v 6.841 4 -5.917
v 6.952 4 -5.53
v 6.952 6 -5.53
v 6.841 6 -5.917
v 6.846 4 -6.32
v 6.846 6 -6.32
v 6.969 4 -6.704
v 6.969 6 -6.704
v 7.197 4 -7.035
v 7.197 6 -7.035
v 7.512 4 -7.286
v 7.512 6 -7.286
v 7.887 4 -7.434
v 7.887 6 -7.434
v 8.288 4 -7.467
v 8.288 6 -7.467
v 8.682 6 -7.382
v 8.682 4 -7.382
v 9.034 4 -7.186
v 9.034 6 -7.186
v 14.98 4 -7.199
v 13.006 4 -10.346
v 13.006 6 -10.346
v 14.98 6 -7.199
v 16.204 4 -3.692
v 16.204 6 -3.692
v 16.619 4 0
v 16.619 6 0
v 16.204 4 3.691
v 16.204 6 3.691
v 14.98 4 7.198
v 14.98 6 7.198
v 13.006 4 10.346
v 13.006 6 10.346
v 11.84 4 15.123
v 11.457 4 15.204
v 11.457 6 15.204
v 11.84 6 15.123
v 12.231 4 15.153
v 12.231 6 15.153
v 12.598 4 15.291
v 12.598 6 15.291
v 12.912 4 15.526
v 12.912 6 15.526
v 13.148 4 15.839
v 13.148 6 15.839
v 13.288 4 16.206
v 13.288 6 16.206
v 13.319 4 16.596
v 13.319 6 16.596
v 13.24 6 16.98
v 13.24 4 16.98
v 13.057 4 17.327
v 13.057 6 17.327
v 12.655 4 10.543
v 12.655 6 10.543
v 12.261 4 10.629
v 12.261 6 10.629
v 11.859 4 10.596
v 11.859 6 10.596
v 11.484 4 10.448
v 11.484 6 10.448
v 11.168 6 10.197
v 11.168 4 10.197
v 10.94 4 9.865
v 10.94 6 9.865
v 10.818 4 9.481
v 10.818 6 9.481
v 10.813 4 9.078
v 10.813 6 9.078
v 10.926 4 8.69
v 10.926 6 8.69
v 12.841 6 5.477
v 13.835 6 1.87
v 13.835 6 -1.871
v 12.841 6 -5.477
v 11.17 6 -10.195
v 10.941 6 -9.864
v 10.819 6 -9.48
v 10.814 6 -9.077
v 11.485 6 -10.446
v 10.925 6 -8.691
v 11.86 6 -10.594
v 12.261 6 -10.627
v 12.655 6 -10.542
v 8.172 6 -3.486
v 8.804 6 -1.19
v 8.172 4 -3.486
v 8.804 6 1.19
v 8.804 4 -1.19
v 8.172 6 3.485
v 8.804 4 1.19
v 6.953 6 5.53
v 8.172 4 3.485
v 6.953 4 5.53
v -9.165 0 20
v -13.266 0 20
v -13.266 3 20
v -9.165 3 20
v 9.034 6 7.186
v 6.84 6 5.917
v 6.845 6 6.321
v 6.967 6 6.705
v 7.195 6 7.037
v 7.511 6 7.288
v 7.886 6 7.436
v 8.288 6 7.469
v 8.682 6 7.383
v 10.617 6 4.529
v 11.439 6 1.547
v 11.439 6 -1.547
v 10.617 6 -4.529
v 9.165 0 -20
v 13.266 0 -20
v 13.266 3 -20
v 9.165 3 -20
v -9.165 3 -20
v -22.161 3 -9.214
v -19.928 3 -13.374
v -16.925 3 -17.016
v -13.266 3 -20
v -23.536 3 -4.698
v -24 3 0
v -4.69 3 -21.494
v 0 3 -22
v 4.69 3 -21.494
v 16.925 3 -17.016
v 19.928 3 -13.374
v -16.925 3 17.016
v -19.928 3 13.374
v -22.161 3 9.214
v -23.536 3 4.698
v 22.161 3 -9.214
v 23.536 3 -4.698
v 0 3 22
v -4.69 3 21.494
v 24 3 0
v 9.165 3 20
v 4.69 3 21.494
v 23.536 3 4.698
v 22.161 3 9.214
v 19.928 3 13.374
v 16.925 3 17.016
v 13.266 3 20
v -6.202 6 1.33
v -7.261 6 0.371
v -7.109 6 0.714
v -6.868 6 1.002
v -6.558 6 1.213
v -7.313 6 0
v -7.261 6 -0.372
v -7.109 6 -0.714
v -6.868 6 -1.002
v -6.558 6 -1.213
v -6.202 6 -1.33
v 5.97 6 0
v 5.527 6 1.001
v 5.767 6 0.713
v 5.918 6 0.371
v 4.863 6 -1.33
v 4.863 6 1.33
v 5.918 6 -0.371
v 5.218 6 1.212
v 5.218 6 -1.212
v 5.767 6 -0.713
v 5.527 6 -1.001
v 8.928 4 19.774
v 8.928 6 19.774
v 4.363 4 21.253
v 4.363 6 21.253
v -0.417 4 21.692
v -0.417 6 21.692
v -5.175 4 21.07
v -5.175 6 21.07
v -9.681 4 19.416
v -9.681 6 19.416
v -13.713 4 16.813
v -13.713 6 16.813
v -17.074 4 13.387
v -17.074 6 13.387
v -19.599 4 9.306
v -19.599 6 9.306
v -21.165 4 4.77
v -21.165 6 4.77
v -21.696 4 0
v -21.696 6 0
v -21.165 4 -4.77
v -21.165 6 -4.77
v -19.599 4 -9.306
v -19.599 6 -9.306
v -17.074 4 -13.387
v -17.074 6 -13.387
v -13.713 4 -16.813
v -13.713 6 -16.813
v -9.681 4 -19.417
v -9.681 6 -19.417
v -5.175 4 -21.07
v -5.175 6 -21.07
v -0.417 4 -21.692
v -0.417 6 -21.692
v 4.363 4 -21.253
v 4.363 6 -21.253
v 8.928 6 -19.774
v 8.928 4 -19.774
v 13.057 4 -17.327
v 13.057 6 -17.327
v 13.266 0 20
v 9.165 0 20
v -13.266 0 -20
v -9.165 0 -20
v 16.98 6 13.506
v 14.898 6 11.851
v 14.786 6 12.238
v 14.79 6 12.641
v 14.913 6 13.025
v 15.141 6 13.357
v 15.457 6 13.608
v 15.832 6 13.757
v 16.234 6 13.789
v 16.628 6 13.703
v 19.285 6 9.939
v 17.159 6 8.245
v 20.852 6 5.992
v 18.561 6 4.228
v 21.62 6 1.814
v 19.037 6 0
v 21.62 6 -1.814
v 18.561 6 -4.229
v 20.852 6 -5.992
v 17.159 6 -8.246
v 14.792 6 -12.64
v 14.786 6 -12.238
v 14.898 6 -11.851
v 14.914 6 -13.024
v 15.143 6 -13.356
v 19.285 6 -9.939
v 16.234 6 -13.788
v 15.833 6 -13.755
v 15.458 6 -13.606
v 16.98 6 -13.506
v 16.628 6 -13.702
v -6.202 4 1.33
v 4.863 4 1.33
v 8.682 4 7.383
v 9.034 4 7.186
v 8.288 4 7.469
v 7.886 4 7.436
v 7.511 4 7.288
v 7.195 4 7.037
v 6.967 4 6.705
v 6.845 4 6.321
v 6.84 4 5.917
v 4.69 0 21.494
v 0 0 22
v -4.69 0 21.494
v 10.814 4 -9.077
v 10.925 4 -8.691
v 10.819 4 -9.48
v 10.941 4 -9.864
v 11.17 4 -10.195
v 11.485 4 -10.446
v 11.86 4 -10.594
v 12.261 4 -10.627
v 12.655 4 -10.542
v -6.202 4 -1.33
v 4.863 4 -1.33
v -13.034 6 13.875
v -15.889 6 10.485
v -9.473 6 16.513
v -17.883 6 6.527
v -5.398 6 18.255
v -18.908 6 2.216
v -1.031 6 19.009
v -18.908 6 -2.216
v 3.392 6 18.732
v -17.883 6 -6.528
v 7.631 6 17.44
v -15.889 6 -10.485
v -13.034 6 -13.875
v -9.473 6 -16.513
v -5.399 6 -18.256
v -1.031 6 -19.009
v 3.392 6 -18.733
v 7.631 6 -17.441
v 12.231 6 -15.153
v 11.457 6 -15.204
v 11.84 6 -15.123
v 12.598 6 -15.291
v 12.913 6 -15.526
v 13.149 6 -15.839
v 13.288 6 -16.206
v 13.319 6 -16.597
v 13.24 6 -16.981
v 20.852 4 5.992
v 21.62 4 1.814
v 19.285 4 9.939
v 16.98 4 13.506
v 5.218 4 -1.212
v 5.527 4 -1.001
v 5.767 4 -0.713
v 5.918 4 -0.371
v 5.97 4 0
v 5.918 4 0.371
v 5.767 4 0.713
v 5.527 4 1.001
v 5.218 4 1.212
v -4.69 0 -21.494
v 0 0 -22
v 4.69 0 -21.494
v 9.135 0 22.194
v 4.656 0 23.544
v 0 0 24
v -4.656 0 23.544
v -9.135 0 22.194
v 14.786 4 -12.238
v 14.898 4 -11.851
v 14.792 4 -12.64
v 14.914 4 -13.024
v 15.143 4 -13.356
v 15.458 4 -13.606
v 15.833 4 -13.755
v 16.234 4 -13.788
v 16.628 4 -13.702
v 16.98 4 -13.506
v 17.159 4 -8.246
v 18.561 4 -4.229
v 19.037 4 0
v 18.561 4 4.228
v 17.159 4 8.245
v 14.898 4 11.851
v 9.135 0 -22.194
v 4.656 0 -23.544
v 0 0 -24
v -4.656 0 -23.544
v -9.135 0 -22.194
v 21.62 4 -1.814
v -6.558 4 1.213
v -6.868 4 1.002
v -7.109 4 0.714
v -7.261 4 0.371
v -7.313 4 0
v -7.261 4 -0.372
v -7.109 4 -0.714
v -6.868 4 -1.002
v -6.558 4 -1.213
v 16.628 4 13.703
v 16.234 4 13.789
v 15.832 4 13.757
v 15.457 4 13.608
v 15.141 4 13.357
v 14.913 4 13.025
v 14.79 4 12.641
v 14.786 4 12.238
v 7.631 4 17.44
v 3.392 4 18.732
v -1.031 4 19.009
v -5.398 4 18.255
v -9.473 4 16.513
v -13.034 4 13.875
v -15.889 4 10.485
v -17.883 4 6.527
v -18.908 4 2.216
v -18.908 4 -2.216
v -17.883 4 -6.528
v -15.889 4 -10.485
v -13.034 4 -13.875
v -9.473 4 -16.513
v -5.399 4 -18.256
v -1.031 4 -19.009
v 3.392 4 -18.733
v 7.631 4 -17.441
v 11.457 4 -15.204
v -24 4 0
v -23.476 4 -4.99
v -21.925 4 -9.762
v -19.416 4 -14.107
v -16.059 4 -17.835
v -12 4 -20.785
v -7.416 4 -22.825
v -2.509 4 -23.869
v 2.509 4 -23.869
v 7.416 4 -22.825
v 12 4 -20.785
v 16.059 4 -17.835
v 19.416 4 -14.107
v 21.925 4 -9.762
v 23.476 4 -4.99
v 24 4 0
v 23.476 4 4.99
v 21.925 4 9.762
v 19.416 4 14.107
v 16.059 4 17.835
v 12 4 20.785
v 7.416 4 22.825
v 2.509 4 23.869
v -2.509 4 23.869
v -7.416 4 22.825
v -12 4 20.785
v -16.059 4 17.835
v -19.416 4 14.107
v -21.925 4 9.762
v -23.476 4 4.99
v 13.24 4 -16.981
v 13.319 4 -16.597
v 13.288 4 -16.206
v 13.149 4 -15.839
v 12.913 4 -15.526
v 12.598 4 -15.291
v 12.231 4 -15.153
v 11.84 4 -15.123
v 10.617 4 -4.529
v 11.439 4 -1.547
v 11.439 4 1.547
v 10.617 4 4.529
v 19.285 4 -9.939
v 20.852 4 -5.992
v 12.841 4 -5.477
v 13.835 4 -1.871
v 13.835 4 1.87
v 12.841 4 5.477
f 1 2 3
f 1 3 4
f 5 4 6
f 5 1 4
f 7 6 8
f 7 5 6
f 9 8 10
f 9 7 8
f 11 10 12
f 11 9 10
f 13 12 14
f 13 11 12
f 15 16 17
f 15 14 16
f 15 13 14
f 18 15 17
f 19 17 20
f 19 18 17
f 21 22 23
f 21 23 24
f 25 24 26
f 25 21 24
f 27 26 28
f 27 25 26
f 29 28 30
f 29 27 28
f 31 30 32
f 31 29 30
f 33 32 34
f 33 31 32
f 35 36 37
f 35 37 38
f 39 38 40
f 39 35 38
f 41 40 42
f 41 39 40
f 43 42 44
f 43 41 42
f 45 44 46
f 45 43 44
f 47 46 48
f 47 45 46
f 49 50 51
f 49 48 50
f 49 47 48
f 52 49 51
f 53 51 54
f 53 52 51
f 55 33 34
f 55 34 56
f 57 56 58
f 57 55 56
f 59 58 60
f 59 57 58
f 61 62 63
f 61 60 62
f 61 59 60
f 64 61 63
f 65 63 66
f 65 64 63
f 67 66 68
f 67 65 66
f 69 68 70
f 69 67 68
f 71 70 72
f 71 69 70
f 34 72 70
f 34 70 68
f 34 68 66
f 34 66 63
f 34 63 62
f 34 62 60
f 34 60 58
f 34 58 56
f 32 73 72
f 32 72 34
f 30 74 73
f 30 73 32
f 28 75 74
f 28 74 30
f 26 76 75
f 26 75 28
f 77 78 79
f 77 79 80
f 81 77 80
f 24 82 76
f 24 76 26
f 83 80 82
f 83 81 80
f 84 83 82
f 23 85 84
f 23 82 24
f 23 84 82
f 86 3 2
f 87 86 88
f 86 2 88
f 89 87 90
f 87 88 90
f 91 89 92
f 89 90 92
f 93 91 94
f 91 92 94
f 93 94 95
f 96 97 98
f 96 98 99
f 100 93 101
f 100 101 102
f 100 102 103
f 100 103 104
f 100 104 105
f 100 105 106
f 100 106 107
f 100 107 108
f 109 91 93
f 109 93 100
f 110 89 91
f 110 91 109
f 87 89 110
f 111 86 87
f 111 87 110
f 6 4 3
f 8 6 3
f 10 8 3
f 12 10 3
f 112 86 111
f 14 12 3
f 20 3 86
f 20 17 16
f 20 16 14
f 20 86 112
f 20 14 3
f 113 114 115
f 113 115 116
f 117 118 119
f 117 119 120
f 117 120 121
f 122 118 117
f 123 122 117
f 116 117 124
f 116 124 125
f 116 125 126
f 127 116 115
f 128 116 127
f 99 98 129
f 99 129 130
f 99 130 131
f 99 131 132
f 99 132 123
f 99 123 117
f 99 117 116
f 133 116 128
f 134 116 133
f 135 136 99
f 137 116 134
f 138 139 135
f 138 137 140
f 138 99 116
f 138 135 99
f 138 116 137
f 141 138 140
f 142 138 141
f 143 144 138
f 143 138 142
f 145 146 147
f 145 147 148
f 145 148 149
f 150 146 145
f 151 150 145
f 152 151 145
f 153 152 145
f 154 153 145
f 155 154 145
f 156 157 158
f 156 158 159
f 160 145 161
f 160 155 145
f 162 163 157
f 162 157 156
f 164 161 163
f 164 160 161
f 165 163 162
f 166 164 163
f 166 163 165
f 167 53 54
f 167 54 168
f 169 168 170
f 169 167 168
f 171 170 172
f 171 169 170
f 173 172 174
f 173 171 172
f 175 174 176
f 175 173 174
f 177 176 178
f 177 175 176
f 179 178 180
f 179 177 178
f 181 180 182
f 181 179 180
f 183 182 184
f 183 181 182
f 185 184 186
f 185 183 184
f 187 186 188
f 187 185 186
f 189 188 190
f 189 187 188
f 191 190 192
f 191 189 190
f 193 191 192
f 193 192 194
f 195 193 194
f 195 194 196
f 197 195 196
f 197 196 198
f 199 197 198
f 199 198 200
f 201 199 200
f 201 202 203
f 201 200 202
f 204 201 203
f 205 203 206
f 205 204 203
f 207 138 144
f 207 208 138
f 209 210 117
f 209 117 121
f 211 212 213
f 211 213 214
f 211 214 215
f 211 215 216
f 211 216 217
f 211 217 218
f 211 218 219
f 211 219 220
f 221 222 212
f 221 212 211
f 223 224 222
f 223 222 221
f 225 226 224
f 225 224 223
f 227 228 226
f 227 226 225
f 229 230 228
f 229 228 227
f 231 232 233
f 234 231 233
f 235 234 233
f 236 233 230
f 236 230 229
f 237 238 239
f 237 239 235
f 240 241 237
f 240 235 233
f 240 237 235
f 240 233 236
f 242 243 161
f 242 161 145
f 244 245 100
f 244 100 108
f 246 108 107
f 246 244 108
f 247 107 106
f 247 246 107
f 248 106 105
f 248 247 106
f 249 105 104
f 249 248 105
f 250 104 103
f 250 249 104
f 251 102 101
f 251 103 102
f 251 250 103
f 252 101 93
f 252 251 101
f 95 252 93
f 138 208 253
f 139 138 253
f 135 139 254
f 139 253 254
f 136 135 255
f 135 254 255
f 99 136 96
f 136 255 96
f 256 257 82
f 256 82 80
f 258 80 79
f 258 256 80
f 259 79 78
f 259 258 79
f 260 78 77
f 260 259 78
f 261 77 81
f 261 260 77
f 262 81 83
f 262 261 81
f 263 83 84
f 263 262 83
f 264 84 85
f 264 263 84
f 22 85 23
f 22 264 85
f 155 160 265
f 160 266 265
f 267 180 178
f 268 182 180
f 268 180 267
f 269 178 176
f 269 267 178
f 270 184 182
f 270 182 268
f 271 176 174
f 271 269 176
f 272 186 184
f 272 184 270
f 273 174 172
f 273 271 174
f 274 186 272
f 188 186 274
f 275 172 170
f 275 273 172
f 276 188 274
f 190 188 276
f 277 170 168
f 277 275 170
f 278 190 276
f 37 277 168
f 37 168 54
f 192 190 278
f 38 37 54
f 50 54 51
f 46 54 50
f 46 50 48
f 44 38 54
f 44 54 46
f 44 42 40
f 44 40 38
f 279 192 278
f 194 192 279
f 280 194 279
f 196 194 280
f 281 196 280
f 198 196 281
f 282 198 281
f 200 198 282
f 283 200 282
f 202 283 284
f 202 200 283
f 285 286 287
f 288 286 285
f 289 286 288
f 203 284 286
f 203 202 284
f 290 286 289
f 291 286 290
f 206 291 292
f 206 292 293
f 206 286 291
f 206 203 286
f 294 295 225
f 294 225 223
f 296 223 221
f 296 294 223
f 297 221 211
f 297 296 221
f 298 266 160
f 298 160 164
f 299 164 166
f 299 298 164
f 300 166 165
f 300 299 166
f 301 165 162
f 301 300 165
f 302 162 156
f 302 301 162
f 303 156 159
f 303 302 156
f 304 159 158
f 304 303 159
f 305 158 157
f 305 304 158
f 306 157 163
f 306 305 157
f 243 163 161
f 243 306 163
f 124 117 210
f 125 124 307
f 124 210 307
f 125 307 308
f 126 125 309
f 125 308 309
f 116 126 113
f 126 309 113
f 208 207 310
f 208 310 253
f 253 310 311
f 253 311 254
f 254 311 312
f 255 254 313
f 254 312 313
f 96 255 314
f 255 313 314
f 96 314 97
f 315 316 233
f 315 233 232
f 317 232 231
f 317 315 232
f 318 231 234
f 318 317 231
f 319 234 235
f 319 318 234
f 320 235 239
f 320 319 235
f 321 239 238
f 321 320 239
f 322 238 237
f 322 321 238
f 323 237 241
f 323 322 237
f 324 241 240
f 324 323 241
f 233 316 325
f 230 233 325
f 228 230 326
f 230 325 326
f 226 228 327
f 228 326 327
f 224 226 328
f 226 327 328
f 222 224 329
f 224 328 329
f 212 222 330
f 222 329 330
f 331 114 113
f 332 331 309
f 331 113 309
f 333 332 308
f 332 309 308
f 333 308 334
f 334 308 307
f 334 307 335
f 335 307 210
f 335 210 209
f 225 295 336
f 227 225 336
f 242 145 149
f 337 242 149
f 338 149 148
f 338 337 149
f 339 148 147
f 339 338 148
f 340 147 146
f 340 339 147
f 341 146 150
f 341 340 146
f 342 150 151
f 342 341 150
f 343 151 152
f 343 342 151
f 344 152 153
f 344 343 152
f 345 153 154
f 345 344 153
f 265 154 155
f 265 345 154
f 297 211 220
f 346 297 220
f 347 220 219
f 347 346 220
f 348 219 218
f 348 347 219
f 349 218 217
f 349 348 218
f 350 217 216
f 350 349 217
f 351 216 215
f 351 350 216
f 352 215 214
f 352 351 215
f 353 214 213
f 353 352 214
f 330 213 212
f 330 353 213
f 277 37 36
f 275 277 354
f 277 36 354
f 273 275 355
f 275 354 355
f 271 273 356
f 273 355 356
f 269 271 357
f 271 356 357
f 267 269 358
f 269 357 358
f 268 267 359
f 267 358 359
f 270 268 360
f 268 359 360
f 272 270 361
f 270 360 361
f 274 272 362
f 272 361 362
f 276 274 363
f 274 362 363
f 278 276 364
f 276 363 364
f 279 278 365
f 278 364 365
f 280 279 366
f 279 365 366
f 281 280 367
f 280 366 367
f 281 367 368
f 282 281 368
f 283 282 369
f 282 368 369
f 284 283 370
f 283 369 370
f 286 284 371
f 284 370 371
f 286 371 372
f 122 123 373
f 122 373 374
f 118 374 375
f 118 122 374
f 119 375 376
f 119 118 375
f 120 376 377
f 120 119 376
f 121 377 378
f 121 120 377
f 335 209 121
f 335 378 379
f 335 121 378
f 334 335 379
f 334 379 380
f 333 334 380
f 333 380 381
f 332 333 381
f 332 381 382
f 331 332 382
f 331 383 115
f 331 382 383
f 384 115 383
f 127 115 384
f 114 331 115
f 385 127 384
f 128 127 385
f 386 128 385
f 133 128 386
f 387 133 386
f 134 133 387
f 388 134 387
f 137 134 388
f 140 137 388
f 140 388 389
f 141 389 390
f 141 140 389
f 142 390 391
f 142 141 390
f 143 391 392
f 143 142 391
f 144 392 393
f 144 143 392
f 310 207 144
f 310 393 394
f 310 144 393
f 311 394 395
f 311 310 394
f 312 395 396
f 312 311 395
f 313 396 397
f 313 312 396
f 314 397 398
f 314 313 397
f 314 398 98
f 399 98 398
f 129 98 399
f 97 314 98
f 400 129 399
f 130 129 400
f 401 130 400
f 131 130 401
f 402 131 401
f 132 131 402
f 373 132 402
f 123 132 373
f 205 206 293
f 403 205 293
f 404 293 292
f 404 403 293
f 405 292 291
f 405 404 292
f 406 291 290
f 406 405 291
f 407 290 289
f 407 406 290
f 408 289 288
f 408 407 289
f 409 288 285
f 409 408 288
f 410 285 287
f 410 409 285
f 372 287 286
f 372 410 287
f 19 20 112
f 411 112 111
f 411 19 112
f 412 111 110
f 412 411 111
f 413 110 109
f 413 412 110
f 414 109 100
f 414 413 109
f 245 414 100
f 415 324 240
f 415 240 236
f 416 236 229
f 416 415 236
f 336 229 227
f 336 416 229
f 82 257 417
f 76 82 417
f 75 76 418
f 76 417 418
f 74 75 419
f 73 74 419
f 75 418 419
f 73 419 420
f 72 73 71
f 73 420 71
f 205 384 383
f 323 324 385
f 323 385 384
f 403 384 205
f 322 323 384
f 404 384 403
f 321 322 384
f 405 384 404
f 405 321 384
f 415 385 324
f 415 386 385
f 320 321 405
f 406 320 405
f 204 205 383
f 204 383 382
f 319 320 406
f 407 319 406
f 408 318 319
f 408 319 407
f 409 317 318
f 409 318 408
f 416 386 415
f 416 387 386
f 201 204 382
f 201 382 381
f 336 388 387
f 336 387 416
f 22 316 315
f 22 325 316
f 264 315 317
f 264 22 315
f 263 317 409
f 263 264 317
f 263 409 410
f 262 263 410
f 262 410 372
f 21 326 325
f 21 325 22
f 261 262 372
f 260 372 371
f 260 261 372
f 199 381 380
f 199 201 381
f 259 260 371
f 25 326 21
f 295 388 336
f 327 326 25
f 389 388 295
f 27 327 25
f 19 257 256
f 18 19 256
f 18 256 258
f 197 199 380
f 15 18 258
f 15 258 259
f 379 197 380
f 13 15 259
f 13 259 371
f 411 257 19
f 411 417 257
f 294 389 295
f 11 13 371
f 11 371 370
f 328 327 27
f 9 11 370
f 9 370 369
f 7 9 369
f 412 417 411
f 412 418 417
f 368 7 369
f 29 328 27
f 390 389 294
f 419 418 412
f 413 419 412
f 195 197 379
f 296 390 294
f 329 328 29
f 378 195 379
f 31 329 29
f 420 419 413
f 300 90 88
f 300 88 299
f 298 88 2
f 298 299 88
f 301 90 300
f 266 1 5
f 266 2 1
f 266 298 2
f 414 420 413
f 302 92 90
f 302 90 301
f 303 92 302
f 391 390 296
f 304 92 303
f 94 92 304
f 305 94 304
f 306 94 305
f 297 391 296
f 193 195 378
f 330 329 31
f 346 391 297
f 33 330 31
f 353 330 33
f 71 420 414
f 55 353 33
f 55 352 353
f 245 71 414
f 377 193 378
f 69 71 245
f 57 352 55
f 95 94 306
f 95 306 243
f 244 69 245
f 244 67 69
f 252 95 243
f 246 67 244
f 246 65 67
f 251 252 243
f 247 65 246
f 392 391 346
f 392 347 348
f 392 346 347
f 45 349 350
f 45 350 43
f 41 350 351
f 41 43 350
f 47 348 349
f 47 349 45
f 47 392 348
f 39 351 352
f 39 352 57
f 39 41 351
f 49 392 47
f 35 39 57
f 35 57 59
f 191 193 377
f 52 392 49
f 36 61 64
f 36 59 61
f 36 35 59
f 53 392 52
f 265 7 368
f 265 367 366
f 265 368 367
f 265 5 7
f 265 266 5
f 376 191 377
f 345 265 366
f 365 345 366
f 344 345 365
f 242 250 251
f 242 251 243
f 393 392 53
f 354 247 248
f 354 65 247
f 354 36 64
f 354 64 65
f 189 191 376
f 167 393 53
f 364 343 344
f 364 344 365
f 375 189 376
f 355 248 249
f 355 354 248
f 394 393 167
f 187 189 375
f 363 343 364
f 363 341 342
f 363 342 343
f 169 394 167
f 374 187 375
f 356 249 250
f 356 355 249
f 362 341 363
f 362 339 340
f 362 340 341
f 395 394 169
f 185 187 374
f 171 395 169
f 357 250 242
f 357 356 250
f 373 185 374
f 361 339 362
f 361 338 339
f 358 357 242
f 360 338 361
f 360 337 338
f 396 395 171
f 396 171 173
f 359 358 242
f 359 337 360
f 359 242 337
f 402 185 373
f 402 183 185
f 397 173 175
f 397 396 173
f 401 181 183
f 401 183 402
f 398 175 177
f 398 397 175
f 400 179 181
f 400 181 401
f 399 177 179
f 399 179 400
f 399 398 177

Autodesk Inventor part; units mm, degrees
ref_plane "YZ Plane" through (0, 0, 0) normal (1, 0, 0) x (0, 1, 0)
ref_plane "XZ Plane" through (0, 0, 0) normal (0, 1, 0) x (-1, 0, 0)
ref_plane "XY Plane" through (0, 0, 0) normal (0, 0, 1) x (1, 0, 0)
sketch "Sketch1" plane through (0, 0, 0) normal (0, 1, 0) x (-1, 0, 0)
  circle A0 centre (0, 0) radius 24
  circle A1 centre (0, 0) radius 22
  dimension "d0" = 48
  dimension "d2" = 2
extrude "Extrusion1" add sketch "Sketch1" along normal blind 4
sketch "Sketch2" plane through (0, 4, 0) normal (0, 1, 0) x (1, 0, 0)
  circle A0 centre (0, 0) radius 24
  circle A1 centre (0, 0) radius 22
  circle A2 centre (0, 0) radius 20
  circle A3 centre (0, 0) radius 17
  circle A4 centre (0, 0) radius 14
  circle A5 centre (0, 0) radius 11
  circle A6 centre (0, 0) radius 7
  circle A7 centre (0, 0) radius 4
  dimension "d10" = 40
  dimension "d11" = 48
  dimension "d12" = 44
  dimension "d13" = 34
  dimension "d14" = 28
  dimension "d15" = 22
  dimension "d16" = 14
  dimension "d17" = 8
extrude "Extrusion2" add sketch "Sketch2" against normal blind 1 contours A0 | A1 | A2 | A3 | A4 | A5 | A6 | A7
sketch "Sketch3" plane through (0, 0, 0) normal (0, -1, 0) x (1, 0, 0)
  line L0 (-30, 20) -> (30, 20)
  line L1 (30, 20) -> (30, -20)
  line L2 (30, -20) -> (-30, -20)
  line L3 (-30, -20) -> (-30, 20)
  line L4 (-30, 20) -> (30, -20) construction
  line L5 (30, 20) -> (-30, -20) construction
  point P0 (0, 0)
  dimension "d7" = 60
  dimension "d8" = 40
sketch "Sketch4" plane through (0, 4, 0) normal (0, 1, 0) x (1, 0, 0)
  circle A0 centre (-0.0001, 0.0001) radius 21.6961
  circle A1 centre (-0.0001, 0.0001) radius 19.037
  circle A2 centre (-0.0001, 0.0001) radius 16.6196
  circle A3 centre (-0.0001, 0.0001) radius 11.5431
  circle A4 centre (-0.0001, 0.0001) radius 8.884
  circle A5 centre (-0.0001, 0.0001) radius 13.9605
  line L0 (-0.0001, 21.6962) -> (-0.0001, -21.696) construction
  line L1 (-0.0001, 0.0001) -> (16.9795, -13.5061)
  line L2 (-0.0001, 0.0001) -> (13.057, -17.3272)
  arc A6 (14.8984, -11.8507) -> (16.9795, -13.5061) centre (16.142, -12.4231) ccw
  line L3 (15.9389, -12.6784) -> (16.1106, -12.4626) construction
  arc A7 (10.9255, -8.6905) -> (13.0065, -10.3459) centre (12.1691, -9.2629) ccw
  arc A8 (6.9526, -5.5303) -> (9.0336, -7.1857) centre (8.1962, -6.1027) ccw
  arc A9 (13.057, -17.3272) -> (11.4567, -15.2035) centre (11.9307, -16.5111) ccw
  arc A10 (16.9795, 13.5062) -> (14.8983, 11.8508) centre (16.144, 12.4206) ccw
  line L4 (-0.0001, 0.0001) -> (16.9795, 13.5062)
  arc A11 (13.0065, 10.346) -> (10.9254, 8.6906) centre (12.1712, 9.2602) ccw
  arc A12 (9.0335, 7.1858) -> (6.9525, 5.5304) centre (8.1983, 6.1) ccw
  arc A13 (11.4566, 15.2036) -> (13.057, 17.3274) centre (11.9308, 16.5111) ccw
  line L5 (-0.0001, 0.0001) -> (13.057, 17.3274)
  line L6 (15.9389, 12.6785) -> (16.1126, 12.4601) construction
  line L7 (19.0369, 0.0001) -> (16.6195, 0.0001)
  line L8 (13.9604, 0.0001) -> (11.543, 0.0001)
  line L9 (8.8839, 0.0001) -> (-21.6962, 0.0001)
  line L10 (21.62, -21.5289) -> (21.62, 21.5289)
  line L11 (-0.0001, 0.0001) -> (35.6066, 0.0001)
  line L12 (4.8627, -1.3296) -> (-6.2016, -1.3296)
  line L13 (4.8627, 1.3297) -> (-6.2016, 1.3297)
  line L14 (3.3126, -1.3296) -> (3.3126, 1.3297)
  arc A14 (4.8627, -1.3296) -> (4.8627, 1.3297) centre (4.6178, 0.0001) ccw
  arc A15 (-6.2016, 1.3297) -> (-6.2016, -1.3296) centre (-5.9623, 0.0001) ccw
  point P0 (0, 0)
  point P1 (21.6199, 0.0001)
  point P2 (-0.0001, 21.529)
  point P3 (3.3126, 0.0001)
  point P4 (28.4358, 37.7355)
  point P5 (32.4077, 43.0065)
  point P6 (22.4217, 17.835)
  point P7 (17.2565, 13.7264)
  point P8 (32.2826, 25.6787)
  point P9 (27.1174, 21.5701)
  point P10 (53.6613, 4.5036)
  point P11 (42.1434, 33.5224)
  point P12 (36.9782, 29.4138)
  point P13 (53.6613, -4.5036)
  point P14 (9.0336, 7.1858)
  point P15 (6.9523, 5.5309)
  point P16 (13.0065, 10.346)
  point P17 (10.9252, 8.6911)
  point P18 (11.457, 15.2035)
  point P19 (21.62, -1.8147)
  point P20 (21.62, 1.8149)
  point P21 (14.8981, 11.8513)
  dimension "d18" = 38.074
  dimension "d19" = 2.6591
  dimension "d20" = 2.6591
  dimension "d21" = 2.6591
  dimension "d22" = 2.4174
  dimension "d23" = 2.4174
  dimension "d24" = 1.369
  dimension "d25" = 2.6593
  dimension "d26" = 1.352
  dimension "d27" = 1.351
extrude "Extrusion3" add sketch "Sketch4" along normal blind 2 contours L4 A10 | A0 L10 L11 A1 L4 | L5 A1 L9 A0 | A13 L5 | L9 A1 L2 A0 | L10 A0 L1 A1 L11 | A2 L11 A5 L4 | L4 A11 | L2 A9 | L1 A6 | A2 L1 A5 L11 | A7 L1 | A3 L11 A4 L4 | L4 A12 | A3 L1 A4 L11 | A8 L1 | L13 L14 L9 L4 | L4 L5 L13 | L5 L9 A15 L13 | A14 L12 L14 L9 | L9 L14 L13 A14 | L9 L14 L12 L1 | L1 L12 L2 | L2 L12 A15 L9
extrude "Extrusion4" cut sketch "Sketch3" against normal up to surface (3 mm away)
properties part number "Scanner-Kapak"
